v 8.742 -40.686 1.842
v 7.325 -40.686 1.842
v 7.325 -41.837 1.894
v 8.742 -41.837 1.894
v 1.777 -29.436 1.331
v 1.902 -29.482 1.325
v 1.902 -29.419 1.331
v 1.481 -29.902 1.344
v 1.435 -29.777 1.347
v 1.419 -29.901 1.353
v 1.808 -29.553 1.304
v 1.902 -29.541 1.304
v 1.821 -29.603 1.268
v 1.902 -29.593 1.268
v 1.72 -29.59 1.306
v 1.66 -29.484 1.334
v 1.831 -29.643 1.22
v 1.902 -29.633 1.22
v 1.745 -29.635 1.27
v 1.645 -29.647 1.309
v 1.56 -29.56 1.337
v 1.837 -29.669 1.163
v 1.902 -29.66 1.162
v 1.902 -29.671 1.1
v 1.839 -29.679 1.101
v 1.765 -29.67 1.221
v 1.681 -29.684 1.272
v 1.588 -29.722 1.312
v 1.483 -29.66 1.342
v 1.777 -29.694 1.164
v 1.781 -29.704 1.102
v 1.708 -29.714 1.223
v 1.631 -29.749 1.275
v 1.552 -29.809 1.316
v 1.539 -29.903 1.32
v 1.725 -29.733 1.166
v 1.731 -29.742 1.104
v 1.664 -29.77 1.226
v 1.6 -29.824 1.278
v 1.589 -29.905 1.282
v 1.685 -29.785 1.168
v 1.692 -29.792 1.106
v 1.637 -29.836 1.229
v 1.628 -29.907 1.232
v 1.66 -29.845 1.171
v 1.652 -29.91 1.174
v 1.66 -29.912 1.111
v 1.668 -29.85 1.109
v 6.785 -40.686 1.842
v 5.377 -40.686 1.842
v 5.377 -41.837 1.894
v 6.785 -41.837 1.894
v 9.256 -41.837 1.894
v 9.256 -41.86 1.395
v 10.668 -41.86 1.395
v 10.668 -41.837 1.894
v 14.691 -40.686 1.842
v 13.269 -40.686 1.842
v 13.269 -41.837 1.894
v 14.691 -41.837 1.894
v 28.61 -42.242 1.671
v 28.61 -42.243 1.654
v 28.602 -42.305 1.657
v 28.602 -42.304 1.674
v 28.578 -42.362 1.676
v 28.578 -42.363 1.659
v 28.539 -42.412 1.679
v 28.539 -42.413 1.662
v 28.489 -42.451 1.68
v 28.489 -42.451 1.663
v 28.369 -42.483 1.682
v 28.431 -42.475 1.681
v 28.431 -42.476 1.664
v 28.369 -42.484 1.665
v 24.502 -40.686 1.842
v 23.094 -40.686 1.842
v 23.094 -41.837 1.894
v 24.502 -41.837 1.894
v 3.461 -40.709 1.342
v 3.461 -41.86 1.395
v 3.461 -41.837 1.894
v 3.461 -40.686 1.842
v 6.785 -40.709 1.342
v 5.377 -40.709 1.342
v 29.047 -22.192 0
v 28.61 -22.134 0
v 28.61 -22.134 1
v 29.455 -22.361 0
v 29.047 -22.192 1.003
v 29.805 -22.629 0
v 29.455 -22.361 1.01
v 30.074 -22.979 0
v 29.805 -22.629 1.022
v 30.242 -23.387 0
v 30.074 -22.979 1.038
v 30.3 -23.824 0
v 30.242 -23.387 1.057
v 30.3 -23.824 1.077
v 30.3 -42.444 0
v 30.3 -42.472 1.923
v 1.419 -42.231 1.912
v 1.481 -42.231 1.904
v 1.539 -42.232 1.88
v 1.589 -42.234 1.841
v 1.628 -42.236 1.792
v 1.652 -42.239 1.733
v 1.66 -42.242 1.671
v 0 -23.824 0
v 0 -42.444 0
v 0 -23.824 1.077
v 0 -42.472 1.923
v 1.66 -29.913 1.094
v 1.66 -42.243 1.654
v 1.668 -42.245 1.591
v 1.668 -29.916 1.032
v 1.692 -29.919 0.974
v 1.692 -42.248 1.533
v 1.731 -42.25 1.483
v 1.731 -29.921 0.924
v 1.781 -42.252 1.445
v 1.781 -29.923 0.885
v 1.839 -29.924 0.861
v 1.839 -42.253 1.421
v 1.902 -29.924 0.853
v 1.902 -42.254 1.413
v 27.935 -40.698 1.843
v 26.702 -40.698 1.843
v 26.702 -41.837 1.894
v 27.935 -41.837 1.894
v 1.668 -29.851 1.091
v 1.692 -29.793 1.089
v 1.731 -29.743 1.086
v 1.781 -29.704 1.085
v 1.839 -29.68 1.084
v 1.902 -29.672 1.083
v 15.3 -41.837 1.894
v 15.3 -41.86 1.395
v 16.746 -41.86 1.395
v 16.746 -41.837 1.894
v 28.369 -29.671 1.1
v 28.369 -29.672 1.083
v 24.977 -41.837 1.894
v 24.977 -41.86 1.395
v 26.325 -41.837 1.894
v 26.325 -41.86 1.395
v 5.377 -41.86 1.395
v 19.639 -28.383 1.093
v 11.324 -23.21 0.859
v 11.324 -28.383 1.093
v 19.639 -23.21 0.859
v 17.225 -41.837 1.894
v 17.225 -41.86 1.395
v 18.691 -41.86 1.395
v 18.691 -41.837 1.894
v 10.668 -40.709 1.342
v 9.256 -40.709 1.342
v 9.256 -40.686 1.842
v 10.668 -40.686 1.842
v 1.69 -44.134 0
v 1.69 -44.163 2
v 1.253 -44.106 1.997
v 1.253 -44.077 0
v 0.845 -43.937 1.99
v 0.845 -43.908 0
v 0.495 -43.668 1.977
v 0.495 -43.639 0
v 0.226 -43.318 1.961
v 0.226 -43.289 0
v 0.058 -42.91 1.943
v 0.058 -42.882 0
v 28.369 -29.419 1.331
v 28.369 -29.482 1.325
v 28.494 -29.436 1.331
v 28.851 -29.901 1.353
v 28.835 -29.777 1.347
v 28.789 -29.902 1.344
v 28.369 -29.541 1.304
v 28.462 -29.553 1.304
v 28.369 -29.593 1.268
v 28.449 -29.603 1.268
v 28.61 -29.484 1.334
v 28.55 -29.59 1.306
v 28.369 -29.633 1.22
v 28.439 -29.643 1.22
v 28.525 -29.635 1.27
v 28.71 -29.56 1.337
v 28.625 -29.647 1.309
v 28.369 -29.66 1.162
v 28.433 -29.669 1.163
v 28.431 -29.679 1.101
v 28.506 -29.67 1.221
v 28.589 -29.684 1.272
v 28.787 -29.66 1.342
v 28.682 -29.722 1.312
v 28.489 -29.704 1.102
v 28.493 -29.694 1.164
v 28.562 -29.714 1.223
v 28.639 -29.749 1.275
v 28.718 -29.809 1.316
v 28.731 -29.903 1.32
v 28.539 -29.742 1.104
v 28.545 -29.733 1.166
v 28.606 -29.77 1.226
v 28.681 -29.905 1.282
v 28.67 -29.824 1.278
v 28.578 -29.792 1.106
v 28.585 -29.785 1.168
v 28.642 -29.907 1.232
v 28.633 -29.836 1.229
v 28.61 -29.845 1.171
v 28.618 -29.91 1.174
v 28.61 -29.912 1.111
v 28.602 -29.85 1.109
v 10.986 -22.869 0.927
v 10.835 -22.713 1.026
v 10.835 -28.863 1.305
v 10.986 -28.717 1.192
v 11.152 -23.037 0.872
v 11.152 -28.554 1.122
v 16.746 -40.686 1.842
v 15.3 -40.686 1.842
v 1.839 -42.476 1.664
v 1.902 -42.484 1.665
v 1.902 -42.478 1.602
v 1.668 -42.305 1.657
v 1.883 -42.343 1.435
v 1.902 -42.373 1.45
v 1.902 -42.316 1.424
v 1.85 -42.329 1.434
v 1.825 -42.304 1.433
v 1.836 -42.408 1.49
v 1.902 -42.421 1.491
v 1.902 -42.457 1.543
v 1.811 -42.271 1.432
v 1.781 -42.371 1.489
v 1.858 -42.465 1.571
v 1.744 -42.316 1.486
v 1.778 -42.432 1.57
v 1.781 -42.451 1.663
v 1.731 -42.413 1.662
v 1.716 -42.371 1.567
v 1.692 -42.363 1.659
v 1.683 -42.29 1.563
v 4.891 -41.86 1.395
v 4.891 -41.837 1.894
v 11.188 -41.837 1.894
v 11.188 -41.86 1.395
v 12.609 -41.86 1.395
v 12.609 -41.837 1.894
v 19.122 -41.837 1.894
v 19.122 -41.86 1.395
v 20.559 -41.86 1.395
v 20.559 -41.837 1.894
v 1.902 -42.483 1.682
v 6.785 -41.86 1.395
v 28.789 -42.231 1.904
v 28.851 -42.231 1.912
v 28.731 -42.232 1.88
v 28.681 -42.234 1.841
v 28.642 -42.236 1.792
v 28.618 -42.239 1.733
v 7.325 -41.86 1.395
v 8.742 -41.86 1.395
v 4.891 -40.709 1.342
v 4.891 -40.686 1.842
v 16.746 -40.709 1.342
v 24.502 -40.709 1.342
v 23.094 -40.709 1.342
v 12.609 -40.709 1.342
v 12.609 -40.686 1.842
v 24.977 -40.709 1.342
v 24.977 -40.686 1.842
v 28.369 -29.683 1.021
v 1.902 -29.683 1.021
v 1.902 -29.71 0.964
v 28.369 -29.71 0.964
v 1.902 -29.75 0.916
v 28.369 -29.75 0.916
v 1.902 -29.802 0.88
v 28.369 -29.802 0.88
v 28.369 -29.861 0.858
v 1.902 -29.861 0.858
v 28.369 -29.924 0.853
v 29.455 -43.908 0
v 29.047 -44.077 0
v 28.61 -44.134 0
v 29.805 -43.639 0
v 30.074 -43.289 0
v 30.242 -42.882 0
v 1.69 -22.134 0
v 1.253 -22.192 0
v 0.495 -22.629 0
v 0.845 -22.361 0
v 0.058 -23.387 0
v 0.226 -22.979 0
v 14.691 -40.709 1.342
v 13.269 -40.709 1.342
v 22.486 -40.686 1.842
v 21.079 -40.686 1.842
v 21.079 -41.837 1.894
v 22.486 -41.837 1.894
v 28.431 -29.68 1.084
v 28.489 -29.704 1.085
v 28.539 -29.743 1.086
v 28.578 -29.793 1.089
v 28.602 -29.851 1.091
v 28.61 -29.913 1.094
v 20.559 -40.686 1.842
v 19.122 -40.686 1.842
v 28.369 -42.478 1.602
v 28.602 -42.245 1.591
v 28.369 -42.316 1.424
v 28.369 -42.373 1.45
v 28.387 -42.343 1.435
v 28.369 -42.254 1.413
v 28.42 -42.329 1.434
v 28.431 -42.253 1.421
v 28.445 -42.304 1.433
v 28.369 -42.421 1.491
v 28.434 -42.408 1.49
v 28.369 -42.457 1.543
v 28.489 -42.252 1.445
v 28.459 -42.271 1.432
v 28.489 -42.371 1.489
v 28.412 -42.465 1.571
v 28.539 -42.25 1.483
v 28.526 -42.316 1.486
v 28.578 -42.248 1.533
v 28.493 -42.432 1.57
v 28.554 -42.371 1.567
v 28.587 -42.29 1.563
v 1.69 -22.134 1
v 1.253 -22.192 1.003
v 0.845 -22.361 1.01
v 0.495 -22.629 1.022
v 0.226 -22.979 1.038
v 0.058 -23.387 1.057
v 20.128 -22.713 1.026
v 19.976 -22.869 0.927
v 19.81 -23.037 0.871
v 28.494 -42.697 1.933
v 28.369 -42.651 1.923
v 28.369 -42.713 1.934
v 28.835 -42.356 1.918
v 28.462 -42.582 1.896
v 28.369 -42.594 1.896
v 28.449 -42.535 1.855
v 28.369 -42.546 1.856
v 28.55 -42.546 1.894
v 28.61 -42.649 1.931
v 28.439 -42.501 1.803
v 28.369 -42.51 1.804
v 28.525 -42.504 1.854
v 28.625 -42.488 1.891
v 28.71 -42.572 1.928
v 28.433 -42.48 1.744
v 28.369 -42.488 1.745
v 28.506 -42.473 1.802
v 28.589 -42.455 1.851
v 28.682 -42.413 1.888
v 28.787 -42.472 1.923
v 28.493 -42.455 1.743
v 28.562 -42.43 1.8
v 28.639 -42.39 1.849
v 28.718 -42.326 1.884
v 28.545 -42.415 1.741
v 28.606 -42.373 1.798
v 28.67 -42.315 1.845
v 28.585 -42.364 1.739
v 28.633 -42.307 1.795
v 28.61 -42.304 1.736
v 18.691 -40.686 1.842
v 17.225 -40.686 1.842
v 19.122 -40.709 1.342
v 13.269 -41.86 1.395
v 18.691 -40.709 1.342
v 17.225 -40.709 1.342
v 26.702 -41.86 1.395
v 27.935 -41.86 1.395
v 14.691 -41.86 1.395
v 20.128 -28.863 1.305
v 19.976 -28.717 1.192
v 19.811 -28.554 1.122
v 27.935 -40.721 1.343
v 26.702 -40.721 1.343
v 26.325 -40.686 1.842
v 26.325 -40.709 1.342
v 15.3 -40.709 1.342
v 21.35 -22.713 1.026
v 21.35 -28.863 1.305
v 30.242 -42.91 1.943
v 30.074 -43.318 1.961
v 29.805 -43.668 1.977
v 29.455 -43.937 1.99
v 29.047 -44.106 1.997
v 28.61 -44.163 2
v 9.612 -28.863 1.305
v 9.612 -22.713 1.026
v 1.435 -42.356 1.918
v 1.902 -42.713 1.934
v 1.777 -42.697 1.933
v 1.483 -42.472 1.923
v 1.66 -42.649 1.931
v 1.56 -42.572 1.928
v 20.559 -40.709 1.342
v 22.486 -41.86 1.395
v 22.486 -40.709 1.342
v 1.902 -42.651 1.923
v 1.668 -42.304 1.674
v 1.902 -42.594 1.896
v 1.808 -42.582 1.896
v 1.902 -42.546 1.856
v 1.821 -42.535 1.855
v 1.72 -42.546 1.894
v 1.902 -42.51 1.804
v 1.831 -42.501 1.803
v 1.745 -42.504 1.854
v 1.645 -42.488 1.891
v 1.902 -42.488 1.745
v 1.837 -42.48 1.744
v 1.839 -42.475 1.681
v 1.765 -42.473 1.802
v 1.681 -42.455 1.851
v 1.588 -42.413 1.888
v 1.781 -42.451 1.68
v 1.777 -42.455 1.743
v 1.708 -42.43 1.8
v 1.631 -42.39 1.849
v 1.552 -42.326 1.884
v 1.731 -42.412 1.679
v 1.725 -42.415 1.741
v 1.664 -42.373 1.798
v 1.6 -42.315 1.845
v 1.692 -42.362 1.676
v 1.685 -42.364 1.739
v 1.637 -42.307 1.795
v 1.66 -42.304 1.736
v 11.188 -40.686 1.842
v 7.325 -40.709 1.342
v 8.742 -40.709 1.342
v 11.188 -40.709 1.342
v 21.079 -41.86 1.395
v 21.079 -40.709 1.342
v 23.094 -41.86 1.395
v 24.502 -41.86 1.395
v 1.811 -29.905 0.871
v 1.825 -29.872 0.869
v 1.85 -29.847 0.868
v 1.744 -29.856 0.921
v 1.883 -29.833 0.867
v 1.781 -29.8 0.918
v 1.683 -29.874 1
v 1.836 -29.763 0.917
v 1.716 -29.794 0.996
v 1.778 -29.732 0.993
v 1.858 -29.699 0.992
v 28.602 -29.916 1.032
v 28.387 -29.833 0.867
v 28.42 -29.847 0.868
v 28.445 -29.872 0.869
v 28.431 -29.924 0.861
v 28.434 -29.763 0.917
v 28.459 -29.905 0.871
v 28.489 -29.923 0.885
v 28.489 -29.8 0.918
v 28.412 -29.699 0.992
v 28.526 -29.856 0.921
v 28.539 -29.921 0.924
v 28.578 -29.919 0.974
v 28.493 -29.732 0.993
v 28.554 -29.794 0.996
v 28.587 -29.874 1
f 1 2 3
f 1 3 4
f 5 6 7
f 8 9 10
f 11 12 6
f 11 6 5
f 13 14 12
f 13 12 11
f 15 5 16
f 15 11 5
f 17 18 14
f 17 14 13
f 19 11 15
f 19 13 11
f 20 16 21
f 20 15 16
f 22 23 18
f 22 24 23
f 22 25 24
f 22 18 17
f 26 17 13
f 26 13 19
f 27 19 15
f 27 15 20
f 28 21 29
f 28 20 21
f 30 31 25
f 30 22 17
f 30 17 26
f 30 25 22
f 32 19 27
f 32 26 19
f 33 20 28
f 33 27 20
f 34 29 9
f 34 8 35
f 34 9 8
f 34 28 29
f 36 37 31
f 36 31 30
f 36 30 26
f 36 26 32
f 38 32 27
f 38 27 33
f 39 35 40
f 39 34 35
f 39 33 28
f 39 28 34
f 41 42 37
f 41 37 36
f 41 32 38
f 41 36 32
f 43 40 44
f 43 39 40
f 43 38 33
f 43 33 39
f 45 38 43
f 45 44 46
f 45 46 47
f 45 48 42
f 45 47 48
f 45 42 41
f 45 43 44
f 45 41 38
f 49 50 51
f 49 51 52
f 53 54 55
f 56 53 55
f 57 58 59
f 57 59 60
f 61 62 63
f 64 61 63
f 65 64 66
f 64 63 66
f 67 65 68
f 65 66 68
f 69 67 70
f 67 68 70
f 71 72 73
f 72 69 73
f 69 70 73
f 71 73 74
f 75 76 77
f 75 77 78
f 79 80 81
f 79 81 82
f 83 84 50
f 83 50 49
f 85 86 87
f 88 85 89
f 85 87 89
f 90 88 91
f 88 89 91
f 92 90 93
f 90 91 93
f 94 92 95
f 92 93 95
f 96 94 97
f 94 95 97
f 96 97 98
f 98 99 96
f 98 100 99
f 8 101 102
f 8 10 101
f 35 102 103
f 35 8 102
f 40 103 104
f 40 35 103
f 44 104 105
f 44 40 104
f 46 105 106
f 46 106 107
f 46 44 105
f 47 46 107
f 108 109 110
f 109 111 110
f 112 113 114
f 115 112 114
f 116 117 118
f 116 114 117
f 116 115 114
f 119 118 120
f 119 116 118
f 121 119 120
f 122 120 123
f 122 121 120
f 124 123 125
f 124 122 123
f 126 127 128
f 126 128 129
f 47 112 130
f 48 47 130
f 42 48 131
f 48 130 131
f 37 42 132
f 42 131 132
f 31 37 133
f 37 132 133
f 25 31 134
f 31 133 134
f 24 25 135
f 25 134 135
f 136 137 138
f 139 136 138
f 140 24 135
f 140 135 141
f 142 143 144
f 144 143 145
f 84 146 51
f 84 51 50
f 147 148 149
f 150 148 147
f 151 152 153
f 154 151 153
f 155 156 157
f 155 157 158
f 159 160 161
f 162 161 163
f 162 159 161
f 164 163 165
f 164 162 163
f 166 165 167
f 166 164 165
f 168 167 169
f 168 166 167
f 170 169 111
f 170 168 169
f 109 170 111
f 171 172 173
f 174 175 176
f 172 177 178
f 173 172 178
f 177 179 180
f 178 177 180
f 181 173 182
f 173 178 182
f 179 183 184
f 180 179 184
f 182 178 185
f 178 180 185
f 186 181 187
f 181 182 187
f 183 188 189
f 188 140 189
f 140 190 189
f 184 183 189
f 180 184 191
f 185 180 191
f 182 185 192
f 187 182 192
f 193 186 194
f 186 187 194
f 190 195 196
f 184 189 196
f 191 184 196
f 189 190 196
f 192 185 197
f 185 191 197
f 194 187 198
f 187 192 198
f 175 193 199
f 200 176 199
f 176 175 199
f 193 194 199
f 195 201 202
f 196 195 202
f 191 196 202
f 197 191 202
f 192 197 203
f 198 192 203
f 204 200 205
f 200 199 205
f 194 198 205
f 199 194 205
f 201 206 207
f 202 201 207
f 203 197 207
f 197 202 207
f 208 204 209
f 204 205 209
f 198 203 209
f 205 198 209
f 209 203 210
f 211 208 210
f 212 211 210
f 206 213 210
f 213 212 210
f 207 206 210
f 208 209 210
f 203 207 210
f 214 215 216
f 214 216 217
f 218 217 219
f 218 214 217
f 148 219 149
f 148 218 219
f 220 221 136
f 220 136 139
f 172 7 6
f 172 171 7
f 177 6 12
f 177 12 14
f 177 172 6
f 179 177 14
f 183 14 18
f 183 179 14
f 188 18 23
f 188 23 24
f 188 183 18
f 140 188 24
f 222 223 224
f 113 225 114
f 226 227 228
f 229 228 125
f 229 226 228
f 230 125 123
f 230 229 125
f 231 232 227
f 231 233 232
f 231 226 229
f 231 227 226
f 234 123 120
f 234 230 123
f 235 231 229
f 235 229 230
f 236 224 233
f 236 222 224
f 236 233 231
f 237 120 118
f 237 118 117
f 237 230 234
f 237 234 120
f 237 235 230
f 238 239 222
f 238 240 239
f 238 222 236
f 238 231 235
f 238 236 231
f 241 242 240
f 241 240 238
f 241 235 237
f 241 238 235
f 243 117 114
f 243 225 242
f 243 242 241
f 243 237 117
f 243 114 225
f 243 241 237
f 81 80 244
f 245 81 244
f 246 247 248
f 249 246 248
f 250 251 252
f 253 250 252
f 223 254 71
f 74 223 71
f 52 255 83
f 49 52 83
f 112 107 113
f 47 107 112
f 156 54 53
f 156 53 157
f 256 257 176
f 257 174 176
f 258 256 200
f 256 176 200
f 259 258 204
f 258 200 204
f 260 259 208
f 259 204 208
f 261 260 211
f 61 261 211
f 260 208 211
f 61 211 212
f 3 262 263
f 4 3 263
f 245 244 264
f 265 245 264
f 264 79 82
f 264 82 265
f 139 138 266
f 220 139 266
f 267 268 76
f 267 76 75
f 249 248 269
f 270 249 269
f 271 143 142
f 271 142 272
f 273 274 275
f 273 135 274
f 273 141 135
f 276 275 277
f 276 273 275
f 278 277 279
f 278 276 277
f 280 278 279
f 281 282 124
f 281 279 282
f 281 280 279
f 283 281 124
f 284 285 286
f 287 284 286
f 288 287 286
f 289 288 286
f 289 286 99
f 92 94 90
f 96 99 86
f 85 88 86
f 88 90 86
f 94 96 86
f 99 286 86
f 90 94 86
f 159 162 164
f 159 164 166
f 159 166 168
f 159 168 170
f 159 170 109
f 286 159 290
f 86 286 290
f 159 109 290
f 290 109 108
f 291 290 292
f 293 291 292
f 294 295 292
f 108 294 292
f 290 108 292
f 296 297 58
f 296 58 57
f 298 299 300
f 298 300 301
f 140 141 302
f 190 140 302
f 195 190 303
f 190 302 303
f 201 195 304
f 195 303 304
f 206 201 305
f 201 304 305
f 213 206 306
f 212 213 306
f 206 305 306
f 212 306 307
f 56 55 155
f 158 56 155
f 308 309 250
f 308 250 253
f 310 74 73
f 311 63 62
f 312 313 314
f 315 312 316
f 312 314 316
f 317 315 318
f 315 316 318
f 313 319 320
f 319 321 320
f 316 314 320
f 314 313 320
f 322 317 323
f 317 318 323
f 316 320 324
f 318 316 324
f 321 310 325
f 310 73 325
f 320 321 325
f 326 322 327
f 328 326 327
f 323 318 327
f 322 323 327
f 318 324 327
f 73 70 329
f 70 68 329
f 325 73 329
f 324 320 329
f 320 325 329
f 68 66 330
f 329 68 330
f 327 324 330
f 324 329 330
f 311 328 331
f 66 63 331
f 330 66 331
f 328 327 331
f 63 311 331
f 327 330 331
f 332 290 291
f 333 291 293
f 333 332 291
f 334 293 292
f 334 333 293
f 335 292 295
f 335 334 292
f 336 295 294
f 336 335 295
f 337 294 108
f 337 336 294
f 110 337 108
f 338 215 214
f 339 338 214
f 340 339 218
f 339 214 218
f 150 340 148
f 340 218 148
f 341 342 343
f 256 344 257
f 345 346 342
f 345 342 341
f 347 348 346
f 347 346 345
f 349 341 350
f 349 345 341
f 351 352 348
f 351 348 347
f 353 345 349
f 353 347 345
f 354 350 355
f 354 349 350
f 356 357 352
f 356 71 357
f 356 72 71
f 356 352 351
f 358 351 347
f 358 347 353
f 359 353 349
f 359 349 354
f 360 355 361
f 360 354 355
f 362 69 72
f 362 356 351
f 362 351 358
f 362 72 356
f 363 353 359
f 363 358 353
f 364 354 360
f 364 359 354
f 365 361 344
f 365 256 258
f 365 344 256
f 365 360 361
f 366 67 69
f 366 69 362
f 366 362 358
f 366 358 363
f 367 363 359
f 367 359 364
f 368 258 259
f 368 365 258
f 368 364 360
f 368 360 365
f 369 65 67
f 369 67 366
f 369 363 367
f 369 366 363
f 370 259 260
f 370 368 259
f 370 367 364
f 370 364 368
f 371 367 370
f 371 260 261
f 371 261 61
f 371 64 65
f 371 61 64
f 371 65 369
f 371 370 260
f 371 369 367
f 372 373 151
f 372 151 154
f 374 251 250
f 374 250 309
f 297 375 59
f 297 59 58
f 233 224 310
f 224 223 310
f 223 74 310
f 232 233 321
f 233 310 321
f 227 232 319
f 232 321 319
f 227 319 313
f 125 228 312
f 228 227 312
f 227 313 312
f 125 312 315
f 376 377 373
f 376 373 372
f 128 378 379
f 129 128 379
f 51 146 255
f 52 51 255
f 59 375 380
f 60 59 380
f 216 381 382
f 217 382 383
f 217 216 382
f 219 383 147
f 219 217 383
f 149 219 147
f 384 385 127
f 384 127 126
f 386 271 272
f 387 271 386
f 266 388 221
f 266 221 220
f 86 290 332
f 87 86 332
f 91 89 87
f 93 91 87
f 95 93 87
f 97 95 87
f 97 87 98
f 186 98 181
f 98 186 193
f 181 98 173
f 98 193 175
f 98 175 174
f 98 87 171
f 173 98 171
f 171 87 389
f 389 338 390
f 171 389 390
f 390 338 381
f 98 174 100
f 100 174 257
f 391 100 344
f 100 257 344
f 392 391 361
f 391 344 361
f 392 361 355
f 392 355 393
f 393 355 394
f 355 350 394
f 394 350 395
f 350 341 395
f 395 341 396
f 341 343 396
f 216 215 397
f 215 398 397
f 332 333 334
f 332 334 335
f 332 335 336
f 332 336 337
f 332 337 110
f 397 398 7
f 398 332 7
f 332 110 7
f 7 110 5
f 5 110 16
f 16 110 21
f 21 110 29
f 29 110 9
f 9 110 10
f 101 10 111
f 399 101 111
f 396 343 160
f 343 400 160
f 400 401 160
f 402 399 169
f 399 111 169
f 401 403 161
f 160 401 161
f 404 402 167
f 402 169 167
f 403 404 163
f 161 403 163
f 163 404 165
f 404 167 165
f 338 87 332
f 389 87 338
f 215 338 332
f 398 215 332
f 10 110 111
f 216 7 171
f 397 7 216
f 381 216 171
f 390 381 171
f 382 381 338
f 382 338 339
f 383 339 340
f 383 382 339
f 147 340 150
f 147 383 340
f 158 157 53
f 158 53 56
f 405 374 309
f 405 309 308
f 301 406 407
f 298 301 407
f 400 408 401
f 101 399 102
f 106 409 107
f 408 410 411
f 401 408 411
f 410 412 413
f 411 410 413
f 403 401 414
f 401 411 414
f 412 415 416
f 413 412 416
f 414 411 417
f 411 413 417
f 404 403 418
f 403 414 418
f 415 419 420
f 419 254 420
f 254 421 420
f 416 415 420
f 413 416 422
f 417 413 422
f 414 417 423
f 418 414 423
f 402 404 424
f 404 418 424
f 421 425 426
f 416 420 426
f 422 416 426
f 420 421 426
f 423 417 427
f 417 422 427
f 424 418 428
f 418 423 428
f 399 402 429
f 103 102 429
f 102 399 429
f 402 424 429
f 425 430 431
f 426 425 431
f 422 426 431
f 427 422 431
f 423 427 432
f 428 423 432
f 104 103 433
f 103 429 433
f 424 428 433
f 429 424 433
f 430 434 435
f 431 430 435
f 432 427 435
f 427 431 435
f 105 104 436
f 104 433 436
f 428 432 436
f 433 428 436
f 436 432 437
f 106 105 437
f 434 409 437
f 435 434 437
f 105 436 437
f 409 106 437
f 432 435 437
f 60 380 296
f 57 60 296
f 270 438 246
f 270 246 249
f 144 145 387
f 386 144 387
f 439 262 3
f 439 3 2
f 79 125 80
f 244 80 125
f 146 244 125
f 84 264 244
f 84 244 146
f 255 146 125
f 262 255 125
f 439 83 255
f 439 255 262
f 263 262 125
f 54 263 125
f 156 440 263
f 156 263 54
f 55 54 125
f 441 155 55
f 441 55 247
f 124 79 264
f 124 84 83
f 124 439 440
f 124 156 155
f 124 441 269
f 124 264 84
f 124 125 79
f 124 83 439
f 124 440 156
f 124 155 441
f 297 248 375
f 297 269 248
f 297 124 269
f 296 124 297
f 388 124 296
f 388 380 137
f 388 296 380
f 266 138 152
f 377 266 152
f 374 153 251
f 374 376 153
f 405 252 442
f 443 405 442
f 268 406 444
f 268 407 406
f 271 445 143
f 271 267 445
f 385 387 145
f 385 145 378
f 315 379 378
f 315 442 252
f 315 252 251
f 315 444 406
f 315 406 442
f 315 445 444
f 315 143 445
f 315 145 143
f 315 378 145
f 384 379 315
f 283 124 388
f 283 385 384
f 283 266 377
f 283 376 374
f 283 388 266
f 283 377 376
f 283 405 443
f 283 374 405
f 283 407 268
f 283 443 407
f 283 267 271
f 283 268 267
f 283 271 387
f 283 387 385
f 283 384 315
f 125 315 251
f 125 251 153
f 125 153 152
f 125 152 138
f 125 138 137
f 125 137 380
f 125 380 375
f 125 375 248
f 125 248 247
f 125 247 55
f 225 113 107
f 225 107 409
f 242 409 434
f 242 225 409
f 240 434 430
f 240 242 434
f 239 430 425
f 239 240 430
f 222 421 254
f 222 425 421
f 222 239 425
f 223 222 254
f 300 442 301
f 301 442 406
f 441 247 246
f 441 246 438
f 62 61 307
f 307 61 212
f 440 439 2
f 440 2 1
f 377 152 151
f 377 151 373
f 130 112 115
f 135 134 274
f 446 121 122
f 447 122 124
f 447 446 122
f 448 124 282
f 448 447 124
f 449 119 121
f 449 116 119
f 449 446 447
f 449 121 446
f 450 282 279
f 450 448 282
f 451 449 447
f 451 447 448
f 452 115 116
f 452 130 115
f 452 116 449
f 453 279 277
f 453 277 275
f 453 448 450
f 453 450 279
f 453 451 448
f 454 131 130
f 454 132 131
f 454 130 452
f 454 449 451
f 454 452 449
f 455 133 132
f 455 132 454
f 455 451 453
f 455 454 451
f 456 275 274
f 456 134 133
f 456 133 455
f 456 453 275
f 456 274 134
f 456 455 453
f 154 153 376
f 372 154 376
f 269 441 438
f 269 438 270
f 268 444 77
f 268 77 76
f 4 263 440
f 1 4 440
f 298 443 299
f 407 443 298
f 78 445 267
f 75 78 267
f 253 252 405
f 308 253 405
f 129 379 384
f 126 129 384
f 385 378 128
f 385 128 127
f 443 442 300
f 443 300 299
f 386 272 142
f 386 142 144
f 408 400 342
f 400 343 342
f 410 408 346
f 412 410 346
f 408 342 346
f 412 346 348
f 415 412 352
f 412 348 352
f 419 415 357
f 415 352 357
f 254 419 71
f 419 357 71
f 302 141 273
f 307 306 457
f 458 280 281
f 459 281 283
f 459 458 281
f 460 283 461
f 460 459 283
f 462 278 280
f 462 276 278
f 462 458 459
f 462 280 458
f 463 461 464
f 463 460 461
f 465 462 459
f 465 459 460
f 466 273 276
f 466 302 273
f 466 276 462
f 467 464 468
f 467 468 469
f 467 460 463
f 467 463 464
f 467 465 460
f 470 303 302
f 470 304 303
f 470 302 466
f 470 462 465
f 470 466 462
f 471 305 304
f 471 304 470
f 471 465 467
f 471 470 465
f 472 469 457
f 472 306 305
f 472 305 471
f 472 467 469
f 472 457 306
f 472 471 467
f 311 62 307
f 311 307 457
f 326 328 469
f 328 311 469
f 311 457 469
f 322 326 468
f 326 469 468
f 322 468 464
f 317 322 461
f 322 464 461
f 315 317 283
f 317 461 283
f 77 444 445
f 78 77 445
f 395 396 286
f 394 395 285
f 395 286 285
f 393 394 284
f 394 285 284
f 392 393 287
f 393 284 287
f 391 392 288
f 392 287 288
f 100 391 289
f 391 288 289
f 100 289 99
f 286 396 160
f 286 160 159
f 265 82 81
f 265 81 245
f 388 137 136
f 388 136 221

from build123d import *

# Parameters (mm, degrees)
F1_DEPTH     = 30.3
F2_R         = 1.6899494937
F3_W         = 26.949964059
F3_H         = 12.8249995296
F4_DEPTH     = 0.5
F5_R         = 0.2414213562
F6_W         = 1.2325234711
F6_H         = 1.1400654912
F6_W_2       = 1.3488382101
F6_H_2       = 1.1522620916
F6_W_3       = 1.4076605439
F6_W_4       = 1.4072209597
F6_W_5       = 1.4375131577
F6_W_6       = 1.4656018466
F6_W_7       = 1.4457069337
F6_W_8       = 1.4214487746
F6_W_9       = 1.4211460948
F6_W_10      = 1.4119520783
F6_W_11      = 1.4170180075
F6_W_12      = 1.4084377326
F6_W_13      = 1.4295475557
F7_DEPTH     = 0.5
F8_W         = 9.2926481739
F8_H         = 6.1567388475
F9_DEPTH     = 0.19
F10_T1_DEPTH = 11.7376448309
F10_T3_DEPTH = 6.1567388475
F10_T5_DEPTH = 6.1567388475


# Not quite as in the source:
# - a fillet or chamfer that OpenCascade refuses, or shapes differently, is made with other operations: its cross-section is extruded or revolved along the edge and cut away or added


with BuildPart() as f1:
    # F0 (on Right) → F1 (new body)
    with BuildSketch(Plane.YZ):
        Polygon((-44.1633068031, 1.9997905069), (-44.1343598068, 0), (-22.1343598068, 0), (-22.1343598068, 1), align=None)
    extrude(amount=F1_DEPTH)

    # F2
    f2_edges = [f1.edges().sort_by_distance(p)[0] for p in [
        (0, -22.13436, 0.5),
        (30.3, -22.13436, 0.5),
        (30.3, -44.148833, 0.999895),
        (0, -44.148833, 0.999895),
    ]]
    fillet(f2_edges, radius=F2_R)

    # F3 (on face) → F4 (cut)
    with BuildSketch(Plane(origin=(0, -0.0002071974, -0.0045652959), x_dir=(1, 0, 0), z_dir=(0, 0.0453386355, 0.9989716753))):
        with Locations((15.1350684769, -36.10308207)):
            Rectangle(F3_W, F3_H)
    extrude(amount=-F4_DEPTH, mode=Mode.SUBTRACT)

    # F5
    f5_edges = [f1.edges().sort_by_distance(p)[0] for p in [
        (1.660086, -42.483404, 1.67329),
        (28.610051, -42.483404, 1.67329),
        (15.135068, -42.472069, 1.923033),
        (15.135068, -42.494739, 1.423547),
        (1.660086, -36.066164, 1.632299),
        (1.660086, -29.671593, 1.091822),
        (1.660086, -36.088833, 1.132813),
        (28.610051, -29.671593, 1.091822),
        (15.135068, -29.660258, 1.341565),
        (15.135068, -29.682927, 0.842079),
        (28.610051, -36.066164, 1.632299),
        (28.610051, -36.088833, 1.132813),
    ]]
    fillet(f5_edges, radius=F5_R)

    # F6 (on face) → F7 (join)
    with BuildSketch(Plane(origin=(0, -0.0228765151, -0.5040511335), x_dir=(1, 0, 0), z_dir=(0, 0.0453386355, 0.9989716753))):
        with Locations((27.318617329, -41.3098782301)):
            Rectangle(F6_W, F6_H)
        with Locations((25.6510563195, -41.3037799299)):
            Rectangle(F6_W_2, F6_H_2)
        with Locations((23.7977188081, -41.3037799299)):
            Rectangle(F6_W_3, F6_H_2)
        with Locations((21.7823982239, -41.3037799299)):
            Rectangle(F6_W_4, F6_H_2)
        with Locations((19.8403866962, -41.3037799299)):
            Rectangle(F6_W_5, F6_H_2)
        with Locations((17.95785781, -41.3037799299)):
            Rectangle(F6_W_6, F6_H_2)
        with Locations((16.0227976739, -41.3037799299)):
            Rectangle(F6_W_7, F6_H_2)
        with Locations((13.9798414893, -41.3037799299)):
            Rectangle(F6_W_8, F6_H_2)
        with Locations((11.8983006105, -41.3037799299)):
            Rectangle(F6_W_9, F6_H_2)
        with Locations((9.9623361602, -41.3037799299)):
            Rectangle(F6_W_10, F6_H_2)
        with Locations((8.0330308992, -41.3037799299)):
            Rectangle(F6_W_11, F6_H_2)
        with Locations((6.0811268631, -41.3037799299)):
            Rectangle(F6_W_12, F6_H_2)
        with Locations((4.1761151515, -41.3037799299)):
            Rectangle(F6_W_13, F6_H_2)
    extrude(amount=F7_DEPTH)

    # F8 (on face) → F9 (cut)
    with BuildSketch(Plane(origin=(0, -0.0002071974, -0.0045652959), x_dir=(1, 0, 0), z_dir=(0, 0.0453386355, 0.9989716753))):
        with Locations((15.4813206755, -25.8142389357)):
            Rectangle(F8_W, F8_H)
    extrude(amount=-F9_DEPTH, mode=Mode.SUBTRACT)

    # F10: fillet of radius 0.7242640687 on 4 edges, made by hand

    # F10_s2 → F10_t1 (join)
    with BuildSketch(Plane.YZ.offset(9.61249826)):
        with BuildLine():
            ThreePointArc((-28.8631045752, 1.3053861423), (-28.6430306792, 1.1544220499), (-28.3832224346, 1.0934109616))
            Line((-28.3832224346, 1.0934109616), (-28.8717189159, 1.115581524))
            Line((-28.8717189159, 1.115581524), (-28.8631045752, 1.3053861423))
        make_face()
        with BuildLine():
            ThreePointArc((-22.7126968541, 1.026248004), (-22.945540921, 0.8958397321), (-23.2098076761, 0.8586139482))
            Line((-23.2098076761, 0.8586139482), (-22.7213111948, 0.8364433857))
            Line((-22.7213111948, 0.8364433857), (-22.7126968541, 1.026248004))
        make_face()
    extrude(amount=F10_T1_DEPTH)

    # F10_s4 → F10_t3 (join)
    with BuildSketch(Plane(origin=(0, -22.7124896567, 1.0308132999), x_dir=(1, 0, 0), z_dir=(0, -0.9989716753, 0.0453386355))):
        with BuildLine():
            ThreePointArc((10.8349965885, -0.0045699953), (11.061688683, -0.1454009974), (11.3239959199, -0.1945699953))
            Line((11.3239959199, -0.1945699953), (10.8349965885, -0.1945699953))
            Line((10.8349965885, -0.1945699953), (10.8349965885, -0.0045699953))
        make_face()
    extrude(amount=F10_T3_DEPTH)

    # F10_s6 → F10_t5 (join)
    with BuildSketch(Plane(origin=(0, -28.8628973778, 1.3099514382), x_dir=(1, 0, 0), z_dir=(0, 0.9989716753, -0.0453386355))):
        with BuildLine():
            ThreePointArc((20.1276447624, 0.0045699953), (19.9009526679, 0.1454009974), (19.638645431, 0.1945699953))
            Line((19.638645431, 0.1945699953), (20.1276447624, 0.1945699953))
            Line((20.1276447624, 0.1945699953), (20.1276447624, 0.0045699953))
        make_face()
    extrude(amount=F10_T5_DEPTH)


solid = f1.part
